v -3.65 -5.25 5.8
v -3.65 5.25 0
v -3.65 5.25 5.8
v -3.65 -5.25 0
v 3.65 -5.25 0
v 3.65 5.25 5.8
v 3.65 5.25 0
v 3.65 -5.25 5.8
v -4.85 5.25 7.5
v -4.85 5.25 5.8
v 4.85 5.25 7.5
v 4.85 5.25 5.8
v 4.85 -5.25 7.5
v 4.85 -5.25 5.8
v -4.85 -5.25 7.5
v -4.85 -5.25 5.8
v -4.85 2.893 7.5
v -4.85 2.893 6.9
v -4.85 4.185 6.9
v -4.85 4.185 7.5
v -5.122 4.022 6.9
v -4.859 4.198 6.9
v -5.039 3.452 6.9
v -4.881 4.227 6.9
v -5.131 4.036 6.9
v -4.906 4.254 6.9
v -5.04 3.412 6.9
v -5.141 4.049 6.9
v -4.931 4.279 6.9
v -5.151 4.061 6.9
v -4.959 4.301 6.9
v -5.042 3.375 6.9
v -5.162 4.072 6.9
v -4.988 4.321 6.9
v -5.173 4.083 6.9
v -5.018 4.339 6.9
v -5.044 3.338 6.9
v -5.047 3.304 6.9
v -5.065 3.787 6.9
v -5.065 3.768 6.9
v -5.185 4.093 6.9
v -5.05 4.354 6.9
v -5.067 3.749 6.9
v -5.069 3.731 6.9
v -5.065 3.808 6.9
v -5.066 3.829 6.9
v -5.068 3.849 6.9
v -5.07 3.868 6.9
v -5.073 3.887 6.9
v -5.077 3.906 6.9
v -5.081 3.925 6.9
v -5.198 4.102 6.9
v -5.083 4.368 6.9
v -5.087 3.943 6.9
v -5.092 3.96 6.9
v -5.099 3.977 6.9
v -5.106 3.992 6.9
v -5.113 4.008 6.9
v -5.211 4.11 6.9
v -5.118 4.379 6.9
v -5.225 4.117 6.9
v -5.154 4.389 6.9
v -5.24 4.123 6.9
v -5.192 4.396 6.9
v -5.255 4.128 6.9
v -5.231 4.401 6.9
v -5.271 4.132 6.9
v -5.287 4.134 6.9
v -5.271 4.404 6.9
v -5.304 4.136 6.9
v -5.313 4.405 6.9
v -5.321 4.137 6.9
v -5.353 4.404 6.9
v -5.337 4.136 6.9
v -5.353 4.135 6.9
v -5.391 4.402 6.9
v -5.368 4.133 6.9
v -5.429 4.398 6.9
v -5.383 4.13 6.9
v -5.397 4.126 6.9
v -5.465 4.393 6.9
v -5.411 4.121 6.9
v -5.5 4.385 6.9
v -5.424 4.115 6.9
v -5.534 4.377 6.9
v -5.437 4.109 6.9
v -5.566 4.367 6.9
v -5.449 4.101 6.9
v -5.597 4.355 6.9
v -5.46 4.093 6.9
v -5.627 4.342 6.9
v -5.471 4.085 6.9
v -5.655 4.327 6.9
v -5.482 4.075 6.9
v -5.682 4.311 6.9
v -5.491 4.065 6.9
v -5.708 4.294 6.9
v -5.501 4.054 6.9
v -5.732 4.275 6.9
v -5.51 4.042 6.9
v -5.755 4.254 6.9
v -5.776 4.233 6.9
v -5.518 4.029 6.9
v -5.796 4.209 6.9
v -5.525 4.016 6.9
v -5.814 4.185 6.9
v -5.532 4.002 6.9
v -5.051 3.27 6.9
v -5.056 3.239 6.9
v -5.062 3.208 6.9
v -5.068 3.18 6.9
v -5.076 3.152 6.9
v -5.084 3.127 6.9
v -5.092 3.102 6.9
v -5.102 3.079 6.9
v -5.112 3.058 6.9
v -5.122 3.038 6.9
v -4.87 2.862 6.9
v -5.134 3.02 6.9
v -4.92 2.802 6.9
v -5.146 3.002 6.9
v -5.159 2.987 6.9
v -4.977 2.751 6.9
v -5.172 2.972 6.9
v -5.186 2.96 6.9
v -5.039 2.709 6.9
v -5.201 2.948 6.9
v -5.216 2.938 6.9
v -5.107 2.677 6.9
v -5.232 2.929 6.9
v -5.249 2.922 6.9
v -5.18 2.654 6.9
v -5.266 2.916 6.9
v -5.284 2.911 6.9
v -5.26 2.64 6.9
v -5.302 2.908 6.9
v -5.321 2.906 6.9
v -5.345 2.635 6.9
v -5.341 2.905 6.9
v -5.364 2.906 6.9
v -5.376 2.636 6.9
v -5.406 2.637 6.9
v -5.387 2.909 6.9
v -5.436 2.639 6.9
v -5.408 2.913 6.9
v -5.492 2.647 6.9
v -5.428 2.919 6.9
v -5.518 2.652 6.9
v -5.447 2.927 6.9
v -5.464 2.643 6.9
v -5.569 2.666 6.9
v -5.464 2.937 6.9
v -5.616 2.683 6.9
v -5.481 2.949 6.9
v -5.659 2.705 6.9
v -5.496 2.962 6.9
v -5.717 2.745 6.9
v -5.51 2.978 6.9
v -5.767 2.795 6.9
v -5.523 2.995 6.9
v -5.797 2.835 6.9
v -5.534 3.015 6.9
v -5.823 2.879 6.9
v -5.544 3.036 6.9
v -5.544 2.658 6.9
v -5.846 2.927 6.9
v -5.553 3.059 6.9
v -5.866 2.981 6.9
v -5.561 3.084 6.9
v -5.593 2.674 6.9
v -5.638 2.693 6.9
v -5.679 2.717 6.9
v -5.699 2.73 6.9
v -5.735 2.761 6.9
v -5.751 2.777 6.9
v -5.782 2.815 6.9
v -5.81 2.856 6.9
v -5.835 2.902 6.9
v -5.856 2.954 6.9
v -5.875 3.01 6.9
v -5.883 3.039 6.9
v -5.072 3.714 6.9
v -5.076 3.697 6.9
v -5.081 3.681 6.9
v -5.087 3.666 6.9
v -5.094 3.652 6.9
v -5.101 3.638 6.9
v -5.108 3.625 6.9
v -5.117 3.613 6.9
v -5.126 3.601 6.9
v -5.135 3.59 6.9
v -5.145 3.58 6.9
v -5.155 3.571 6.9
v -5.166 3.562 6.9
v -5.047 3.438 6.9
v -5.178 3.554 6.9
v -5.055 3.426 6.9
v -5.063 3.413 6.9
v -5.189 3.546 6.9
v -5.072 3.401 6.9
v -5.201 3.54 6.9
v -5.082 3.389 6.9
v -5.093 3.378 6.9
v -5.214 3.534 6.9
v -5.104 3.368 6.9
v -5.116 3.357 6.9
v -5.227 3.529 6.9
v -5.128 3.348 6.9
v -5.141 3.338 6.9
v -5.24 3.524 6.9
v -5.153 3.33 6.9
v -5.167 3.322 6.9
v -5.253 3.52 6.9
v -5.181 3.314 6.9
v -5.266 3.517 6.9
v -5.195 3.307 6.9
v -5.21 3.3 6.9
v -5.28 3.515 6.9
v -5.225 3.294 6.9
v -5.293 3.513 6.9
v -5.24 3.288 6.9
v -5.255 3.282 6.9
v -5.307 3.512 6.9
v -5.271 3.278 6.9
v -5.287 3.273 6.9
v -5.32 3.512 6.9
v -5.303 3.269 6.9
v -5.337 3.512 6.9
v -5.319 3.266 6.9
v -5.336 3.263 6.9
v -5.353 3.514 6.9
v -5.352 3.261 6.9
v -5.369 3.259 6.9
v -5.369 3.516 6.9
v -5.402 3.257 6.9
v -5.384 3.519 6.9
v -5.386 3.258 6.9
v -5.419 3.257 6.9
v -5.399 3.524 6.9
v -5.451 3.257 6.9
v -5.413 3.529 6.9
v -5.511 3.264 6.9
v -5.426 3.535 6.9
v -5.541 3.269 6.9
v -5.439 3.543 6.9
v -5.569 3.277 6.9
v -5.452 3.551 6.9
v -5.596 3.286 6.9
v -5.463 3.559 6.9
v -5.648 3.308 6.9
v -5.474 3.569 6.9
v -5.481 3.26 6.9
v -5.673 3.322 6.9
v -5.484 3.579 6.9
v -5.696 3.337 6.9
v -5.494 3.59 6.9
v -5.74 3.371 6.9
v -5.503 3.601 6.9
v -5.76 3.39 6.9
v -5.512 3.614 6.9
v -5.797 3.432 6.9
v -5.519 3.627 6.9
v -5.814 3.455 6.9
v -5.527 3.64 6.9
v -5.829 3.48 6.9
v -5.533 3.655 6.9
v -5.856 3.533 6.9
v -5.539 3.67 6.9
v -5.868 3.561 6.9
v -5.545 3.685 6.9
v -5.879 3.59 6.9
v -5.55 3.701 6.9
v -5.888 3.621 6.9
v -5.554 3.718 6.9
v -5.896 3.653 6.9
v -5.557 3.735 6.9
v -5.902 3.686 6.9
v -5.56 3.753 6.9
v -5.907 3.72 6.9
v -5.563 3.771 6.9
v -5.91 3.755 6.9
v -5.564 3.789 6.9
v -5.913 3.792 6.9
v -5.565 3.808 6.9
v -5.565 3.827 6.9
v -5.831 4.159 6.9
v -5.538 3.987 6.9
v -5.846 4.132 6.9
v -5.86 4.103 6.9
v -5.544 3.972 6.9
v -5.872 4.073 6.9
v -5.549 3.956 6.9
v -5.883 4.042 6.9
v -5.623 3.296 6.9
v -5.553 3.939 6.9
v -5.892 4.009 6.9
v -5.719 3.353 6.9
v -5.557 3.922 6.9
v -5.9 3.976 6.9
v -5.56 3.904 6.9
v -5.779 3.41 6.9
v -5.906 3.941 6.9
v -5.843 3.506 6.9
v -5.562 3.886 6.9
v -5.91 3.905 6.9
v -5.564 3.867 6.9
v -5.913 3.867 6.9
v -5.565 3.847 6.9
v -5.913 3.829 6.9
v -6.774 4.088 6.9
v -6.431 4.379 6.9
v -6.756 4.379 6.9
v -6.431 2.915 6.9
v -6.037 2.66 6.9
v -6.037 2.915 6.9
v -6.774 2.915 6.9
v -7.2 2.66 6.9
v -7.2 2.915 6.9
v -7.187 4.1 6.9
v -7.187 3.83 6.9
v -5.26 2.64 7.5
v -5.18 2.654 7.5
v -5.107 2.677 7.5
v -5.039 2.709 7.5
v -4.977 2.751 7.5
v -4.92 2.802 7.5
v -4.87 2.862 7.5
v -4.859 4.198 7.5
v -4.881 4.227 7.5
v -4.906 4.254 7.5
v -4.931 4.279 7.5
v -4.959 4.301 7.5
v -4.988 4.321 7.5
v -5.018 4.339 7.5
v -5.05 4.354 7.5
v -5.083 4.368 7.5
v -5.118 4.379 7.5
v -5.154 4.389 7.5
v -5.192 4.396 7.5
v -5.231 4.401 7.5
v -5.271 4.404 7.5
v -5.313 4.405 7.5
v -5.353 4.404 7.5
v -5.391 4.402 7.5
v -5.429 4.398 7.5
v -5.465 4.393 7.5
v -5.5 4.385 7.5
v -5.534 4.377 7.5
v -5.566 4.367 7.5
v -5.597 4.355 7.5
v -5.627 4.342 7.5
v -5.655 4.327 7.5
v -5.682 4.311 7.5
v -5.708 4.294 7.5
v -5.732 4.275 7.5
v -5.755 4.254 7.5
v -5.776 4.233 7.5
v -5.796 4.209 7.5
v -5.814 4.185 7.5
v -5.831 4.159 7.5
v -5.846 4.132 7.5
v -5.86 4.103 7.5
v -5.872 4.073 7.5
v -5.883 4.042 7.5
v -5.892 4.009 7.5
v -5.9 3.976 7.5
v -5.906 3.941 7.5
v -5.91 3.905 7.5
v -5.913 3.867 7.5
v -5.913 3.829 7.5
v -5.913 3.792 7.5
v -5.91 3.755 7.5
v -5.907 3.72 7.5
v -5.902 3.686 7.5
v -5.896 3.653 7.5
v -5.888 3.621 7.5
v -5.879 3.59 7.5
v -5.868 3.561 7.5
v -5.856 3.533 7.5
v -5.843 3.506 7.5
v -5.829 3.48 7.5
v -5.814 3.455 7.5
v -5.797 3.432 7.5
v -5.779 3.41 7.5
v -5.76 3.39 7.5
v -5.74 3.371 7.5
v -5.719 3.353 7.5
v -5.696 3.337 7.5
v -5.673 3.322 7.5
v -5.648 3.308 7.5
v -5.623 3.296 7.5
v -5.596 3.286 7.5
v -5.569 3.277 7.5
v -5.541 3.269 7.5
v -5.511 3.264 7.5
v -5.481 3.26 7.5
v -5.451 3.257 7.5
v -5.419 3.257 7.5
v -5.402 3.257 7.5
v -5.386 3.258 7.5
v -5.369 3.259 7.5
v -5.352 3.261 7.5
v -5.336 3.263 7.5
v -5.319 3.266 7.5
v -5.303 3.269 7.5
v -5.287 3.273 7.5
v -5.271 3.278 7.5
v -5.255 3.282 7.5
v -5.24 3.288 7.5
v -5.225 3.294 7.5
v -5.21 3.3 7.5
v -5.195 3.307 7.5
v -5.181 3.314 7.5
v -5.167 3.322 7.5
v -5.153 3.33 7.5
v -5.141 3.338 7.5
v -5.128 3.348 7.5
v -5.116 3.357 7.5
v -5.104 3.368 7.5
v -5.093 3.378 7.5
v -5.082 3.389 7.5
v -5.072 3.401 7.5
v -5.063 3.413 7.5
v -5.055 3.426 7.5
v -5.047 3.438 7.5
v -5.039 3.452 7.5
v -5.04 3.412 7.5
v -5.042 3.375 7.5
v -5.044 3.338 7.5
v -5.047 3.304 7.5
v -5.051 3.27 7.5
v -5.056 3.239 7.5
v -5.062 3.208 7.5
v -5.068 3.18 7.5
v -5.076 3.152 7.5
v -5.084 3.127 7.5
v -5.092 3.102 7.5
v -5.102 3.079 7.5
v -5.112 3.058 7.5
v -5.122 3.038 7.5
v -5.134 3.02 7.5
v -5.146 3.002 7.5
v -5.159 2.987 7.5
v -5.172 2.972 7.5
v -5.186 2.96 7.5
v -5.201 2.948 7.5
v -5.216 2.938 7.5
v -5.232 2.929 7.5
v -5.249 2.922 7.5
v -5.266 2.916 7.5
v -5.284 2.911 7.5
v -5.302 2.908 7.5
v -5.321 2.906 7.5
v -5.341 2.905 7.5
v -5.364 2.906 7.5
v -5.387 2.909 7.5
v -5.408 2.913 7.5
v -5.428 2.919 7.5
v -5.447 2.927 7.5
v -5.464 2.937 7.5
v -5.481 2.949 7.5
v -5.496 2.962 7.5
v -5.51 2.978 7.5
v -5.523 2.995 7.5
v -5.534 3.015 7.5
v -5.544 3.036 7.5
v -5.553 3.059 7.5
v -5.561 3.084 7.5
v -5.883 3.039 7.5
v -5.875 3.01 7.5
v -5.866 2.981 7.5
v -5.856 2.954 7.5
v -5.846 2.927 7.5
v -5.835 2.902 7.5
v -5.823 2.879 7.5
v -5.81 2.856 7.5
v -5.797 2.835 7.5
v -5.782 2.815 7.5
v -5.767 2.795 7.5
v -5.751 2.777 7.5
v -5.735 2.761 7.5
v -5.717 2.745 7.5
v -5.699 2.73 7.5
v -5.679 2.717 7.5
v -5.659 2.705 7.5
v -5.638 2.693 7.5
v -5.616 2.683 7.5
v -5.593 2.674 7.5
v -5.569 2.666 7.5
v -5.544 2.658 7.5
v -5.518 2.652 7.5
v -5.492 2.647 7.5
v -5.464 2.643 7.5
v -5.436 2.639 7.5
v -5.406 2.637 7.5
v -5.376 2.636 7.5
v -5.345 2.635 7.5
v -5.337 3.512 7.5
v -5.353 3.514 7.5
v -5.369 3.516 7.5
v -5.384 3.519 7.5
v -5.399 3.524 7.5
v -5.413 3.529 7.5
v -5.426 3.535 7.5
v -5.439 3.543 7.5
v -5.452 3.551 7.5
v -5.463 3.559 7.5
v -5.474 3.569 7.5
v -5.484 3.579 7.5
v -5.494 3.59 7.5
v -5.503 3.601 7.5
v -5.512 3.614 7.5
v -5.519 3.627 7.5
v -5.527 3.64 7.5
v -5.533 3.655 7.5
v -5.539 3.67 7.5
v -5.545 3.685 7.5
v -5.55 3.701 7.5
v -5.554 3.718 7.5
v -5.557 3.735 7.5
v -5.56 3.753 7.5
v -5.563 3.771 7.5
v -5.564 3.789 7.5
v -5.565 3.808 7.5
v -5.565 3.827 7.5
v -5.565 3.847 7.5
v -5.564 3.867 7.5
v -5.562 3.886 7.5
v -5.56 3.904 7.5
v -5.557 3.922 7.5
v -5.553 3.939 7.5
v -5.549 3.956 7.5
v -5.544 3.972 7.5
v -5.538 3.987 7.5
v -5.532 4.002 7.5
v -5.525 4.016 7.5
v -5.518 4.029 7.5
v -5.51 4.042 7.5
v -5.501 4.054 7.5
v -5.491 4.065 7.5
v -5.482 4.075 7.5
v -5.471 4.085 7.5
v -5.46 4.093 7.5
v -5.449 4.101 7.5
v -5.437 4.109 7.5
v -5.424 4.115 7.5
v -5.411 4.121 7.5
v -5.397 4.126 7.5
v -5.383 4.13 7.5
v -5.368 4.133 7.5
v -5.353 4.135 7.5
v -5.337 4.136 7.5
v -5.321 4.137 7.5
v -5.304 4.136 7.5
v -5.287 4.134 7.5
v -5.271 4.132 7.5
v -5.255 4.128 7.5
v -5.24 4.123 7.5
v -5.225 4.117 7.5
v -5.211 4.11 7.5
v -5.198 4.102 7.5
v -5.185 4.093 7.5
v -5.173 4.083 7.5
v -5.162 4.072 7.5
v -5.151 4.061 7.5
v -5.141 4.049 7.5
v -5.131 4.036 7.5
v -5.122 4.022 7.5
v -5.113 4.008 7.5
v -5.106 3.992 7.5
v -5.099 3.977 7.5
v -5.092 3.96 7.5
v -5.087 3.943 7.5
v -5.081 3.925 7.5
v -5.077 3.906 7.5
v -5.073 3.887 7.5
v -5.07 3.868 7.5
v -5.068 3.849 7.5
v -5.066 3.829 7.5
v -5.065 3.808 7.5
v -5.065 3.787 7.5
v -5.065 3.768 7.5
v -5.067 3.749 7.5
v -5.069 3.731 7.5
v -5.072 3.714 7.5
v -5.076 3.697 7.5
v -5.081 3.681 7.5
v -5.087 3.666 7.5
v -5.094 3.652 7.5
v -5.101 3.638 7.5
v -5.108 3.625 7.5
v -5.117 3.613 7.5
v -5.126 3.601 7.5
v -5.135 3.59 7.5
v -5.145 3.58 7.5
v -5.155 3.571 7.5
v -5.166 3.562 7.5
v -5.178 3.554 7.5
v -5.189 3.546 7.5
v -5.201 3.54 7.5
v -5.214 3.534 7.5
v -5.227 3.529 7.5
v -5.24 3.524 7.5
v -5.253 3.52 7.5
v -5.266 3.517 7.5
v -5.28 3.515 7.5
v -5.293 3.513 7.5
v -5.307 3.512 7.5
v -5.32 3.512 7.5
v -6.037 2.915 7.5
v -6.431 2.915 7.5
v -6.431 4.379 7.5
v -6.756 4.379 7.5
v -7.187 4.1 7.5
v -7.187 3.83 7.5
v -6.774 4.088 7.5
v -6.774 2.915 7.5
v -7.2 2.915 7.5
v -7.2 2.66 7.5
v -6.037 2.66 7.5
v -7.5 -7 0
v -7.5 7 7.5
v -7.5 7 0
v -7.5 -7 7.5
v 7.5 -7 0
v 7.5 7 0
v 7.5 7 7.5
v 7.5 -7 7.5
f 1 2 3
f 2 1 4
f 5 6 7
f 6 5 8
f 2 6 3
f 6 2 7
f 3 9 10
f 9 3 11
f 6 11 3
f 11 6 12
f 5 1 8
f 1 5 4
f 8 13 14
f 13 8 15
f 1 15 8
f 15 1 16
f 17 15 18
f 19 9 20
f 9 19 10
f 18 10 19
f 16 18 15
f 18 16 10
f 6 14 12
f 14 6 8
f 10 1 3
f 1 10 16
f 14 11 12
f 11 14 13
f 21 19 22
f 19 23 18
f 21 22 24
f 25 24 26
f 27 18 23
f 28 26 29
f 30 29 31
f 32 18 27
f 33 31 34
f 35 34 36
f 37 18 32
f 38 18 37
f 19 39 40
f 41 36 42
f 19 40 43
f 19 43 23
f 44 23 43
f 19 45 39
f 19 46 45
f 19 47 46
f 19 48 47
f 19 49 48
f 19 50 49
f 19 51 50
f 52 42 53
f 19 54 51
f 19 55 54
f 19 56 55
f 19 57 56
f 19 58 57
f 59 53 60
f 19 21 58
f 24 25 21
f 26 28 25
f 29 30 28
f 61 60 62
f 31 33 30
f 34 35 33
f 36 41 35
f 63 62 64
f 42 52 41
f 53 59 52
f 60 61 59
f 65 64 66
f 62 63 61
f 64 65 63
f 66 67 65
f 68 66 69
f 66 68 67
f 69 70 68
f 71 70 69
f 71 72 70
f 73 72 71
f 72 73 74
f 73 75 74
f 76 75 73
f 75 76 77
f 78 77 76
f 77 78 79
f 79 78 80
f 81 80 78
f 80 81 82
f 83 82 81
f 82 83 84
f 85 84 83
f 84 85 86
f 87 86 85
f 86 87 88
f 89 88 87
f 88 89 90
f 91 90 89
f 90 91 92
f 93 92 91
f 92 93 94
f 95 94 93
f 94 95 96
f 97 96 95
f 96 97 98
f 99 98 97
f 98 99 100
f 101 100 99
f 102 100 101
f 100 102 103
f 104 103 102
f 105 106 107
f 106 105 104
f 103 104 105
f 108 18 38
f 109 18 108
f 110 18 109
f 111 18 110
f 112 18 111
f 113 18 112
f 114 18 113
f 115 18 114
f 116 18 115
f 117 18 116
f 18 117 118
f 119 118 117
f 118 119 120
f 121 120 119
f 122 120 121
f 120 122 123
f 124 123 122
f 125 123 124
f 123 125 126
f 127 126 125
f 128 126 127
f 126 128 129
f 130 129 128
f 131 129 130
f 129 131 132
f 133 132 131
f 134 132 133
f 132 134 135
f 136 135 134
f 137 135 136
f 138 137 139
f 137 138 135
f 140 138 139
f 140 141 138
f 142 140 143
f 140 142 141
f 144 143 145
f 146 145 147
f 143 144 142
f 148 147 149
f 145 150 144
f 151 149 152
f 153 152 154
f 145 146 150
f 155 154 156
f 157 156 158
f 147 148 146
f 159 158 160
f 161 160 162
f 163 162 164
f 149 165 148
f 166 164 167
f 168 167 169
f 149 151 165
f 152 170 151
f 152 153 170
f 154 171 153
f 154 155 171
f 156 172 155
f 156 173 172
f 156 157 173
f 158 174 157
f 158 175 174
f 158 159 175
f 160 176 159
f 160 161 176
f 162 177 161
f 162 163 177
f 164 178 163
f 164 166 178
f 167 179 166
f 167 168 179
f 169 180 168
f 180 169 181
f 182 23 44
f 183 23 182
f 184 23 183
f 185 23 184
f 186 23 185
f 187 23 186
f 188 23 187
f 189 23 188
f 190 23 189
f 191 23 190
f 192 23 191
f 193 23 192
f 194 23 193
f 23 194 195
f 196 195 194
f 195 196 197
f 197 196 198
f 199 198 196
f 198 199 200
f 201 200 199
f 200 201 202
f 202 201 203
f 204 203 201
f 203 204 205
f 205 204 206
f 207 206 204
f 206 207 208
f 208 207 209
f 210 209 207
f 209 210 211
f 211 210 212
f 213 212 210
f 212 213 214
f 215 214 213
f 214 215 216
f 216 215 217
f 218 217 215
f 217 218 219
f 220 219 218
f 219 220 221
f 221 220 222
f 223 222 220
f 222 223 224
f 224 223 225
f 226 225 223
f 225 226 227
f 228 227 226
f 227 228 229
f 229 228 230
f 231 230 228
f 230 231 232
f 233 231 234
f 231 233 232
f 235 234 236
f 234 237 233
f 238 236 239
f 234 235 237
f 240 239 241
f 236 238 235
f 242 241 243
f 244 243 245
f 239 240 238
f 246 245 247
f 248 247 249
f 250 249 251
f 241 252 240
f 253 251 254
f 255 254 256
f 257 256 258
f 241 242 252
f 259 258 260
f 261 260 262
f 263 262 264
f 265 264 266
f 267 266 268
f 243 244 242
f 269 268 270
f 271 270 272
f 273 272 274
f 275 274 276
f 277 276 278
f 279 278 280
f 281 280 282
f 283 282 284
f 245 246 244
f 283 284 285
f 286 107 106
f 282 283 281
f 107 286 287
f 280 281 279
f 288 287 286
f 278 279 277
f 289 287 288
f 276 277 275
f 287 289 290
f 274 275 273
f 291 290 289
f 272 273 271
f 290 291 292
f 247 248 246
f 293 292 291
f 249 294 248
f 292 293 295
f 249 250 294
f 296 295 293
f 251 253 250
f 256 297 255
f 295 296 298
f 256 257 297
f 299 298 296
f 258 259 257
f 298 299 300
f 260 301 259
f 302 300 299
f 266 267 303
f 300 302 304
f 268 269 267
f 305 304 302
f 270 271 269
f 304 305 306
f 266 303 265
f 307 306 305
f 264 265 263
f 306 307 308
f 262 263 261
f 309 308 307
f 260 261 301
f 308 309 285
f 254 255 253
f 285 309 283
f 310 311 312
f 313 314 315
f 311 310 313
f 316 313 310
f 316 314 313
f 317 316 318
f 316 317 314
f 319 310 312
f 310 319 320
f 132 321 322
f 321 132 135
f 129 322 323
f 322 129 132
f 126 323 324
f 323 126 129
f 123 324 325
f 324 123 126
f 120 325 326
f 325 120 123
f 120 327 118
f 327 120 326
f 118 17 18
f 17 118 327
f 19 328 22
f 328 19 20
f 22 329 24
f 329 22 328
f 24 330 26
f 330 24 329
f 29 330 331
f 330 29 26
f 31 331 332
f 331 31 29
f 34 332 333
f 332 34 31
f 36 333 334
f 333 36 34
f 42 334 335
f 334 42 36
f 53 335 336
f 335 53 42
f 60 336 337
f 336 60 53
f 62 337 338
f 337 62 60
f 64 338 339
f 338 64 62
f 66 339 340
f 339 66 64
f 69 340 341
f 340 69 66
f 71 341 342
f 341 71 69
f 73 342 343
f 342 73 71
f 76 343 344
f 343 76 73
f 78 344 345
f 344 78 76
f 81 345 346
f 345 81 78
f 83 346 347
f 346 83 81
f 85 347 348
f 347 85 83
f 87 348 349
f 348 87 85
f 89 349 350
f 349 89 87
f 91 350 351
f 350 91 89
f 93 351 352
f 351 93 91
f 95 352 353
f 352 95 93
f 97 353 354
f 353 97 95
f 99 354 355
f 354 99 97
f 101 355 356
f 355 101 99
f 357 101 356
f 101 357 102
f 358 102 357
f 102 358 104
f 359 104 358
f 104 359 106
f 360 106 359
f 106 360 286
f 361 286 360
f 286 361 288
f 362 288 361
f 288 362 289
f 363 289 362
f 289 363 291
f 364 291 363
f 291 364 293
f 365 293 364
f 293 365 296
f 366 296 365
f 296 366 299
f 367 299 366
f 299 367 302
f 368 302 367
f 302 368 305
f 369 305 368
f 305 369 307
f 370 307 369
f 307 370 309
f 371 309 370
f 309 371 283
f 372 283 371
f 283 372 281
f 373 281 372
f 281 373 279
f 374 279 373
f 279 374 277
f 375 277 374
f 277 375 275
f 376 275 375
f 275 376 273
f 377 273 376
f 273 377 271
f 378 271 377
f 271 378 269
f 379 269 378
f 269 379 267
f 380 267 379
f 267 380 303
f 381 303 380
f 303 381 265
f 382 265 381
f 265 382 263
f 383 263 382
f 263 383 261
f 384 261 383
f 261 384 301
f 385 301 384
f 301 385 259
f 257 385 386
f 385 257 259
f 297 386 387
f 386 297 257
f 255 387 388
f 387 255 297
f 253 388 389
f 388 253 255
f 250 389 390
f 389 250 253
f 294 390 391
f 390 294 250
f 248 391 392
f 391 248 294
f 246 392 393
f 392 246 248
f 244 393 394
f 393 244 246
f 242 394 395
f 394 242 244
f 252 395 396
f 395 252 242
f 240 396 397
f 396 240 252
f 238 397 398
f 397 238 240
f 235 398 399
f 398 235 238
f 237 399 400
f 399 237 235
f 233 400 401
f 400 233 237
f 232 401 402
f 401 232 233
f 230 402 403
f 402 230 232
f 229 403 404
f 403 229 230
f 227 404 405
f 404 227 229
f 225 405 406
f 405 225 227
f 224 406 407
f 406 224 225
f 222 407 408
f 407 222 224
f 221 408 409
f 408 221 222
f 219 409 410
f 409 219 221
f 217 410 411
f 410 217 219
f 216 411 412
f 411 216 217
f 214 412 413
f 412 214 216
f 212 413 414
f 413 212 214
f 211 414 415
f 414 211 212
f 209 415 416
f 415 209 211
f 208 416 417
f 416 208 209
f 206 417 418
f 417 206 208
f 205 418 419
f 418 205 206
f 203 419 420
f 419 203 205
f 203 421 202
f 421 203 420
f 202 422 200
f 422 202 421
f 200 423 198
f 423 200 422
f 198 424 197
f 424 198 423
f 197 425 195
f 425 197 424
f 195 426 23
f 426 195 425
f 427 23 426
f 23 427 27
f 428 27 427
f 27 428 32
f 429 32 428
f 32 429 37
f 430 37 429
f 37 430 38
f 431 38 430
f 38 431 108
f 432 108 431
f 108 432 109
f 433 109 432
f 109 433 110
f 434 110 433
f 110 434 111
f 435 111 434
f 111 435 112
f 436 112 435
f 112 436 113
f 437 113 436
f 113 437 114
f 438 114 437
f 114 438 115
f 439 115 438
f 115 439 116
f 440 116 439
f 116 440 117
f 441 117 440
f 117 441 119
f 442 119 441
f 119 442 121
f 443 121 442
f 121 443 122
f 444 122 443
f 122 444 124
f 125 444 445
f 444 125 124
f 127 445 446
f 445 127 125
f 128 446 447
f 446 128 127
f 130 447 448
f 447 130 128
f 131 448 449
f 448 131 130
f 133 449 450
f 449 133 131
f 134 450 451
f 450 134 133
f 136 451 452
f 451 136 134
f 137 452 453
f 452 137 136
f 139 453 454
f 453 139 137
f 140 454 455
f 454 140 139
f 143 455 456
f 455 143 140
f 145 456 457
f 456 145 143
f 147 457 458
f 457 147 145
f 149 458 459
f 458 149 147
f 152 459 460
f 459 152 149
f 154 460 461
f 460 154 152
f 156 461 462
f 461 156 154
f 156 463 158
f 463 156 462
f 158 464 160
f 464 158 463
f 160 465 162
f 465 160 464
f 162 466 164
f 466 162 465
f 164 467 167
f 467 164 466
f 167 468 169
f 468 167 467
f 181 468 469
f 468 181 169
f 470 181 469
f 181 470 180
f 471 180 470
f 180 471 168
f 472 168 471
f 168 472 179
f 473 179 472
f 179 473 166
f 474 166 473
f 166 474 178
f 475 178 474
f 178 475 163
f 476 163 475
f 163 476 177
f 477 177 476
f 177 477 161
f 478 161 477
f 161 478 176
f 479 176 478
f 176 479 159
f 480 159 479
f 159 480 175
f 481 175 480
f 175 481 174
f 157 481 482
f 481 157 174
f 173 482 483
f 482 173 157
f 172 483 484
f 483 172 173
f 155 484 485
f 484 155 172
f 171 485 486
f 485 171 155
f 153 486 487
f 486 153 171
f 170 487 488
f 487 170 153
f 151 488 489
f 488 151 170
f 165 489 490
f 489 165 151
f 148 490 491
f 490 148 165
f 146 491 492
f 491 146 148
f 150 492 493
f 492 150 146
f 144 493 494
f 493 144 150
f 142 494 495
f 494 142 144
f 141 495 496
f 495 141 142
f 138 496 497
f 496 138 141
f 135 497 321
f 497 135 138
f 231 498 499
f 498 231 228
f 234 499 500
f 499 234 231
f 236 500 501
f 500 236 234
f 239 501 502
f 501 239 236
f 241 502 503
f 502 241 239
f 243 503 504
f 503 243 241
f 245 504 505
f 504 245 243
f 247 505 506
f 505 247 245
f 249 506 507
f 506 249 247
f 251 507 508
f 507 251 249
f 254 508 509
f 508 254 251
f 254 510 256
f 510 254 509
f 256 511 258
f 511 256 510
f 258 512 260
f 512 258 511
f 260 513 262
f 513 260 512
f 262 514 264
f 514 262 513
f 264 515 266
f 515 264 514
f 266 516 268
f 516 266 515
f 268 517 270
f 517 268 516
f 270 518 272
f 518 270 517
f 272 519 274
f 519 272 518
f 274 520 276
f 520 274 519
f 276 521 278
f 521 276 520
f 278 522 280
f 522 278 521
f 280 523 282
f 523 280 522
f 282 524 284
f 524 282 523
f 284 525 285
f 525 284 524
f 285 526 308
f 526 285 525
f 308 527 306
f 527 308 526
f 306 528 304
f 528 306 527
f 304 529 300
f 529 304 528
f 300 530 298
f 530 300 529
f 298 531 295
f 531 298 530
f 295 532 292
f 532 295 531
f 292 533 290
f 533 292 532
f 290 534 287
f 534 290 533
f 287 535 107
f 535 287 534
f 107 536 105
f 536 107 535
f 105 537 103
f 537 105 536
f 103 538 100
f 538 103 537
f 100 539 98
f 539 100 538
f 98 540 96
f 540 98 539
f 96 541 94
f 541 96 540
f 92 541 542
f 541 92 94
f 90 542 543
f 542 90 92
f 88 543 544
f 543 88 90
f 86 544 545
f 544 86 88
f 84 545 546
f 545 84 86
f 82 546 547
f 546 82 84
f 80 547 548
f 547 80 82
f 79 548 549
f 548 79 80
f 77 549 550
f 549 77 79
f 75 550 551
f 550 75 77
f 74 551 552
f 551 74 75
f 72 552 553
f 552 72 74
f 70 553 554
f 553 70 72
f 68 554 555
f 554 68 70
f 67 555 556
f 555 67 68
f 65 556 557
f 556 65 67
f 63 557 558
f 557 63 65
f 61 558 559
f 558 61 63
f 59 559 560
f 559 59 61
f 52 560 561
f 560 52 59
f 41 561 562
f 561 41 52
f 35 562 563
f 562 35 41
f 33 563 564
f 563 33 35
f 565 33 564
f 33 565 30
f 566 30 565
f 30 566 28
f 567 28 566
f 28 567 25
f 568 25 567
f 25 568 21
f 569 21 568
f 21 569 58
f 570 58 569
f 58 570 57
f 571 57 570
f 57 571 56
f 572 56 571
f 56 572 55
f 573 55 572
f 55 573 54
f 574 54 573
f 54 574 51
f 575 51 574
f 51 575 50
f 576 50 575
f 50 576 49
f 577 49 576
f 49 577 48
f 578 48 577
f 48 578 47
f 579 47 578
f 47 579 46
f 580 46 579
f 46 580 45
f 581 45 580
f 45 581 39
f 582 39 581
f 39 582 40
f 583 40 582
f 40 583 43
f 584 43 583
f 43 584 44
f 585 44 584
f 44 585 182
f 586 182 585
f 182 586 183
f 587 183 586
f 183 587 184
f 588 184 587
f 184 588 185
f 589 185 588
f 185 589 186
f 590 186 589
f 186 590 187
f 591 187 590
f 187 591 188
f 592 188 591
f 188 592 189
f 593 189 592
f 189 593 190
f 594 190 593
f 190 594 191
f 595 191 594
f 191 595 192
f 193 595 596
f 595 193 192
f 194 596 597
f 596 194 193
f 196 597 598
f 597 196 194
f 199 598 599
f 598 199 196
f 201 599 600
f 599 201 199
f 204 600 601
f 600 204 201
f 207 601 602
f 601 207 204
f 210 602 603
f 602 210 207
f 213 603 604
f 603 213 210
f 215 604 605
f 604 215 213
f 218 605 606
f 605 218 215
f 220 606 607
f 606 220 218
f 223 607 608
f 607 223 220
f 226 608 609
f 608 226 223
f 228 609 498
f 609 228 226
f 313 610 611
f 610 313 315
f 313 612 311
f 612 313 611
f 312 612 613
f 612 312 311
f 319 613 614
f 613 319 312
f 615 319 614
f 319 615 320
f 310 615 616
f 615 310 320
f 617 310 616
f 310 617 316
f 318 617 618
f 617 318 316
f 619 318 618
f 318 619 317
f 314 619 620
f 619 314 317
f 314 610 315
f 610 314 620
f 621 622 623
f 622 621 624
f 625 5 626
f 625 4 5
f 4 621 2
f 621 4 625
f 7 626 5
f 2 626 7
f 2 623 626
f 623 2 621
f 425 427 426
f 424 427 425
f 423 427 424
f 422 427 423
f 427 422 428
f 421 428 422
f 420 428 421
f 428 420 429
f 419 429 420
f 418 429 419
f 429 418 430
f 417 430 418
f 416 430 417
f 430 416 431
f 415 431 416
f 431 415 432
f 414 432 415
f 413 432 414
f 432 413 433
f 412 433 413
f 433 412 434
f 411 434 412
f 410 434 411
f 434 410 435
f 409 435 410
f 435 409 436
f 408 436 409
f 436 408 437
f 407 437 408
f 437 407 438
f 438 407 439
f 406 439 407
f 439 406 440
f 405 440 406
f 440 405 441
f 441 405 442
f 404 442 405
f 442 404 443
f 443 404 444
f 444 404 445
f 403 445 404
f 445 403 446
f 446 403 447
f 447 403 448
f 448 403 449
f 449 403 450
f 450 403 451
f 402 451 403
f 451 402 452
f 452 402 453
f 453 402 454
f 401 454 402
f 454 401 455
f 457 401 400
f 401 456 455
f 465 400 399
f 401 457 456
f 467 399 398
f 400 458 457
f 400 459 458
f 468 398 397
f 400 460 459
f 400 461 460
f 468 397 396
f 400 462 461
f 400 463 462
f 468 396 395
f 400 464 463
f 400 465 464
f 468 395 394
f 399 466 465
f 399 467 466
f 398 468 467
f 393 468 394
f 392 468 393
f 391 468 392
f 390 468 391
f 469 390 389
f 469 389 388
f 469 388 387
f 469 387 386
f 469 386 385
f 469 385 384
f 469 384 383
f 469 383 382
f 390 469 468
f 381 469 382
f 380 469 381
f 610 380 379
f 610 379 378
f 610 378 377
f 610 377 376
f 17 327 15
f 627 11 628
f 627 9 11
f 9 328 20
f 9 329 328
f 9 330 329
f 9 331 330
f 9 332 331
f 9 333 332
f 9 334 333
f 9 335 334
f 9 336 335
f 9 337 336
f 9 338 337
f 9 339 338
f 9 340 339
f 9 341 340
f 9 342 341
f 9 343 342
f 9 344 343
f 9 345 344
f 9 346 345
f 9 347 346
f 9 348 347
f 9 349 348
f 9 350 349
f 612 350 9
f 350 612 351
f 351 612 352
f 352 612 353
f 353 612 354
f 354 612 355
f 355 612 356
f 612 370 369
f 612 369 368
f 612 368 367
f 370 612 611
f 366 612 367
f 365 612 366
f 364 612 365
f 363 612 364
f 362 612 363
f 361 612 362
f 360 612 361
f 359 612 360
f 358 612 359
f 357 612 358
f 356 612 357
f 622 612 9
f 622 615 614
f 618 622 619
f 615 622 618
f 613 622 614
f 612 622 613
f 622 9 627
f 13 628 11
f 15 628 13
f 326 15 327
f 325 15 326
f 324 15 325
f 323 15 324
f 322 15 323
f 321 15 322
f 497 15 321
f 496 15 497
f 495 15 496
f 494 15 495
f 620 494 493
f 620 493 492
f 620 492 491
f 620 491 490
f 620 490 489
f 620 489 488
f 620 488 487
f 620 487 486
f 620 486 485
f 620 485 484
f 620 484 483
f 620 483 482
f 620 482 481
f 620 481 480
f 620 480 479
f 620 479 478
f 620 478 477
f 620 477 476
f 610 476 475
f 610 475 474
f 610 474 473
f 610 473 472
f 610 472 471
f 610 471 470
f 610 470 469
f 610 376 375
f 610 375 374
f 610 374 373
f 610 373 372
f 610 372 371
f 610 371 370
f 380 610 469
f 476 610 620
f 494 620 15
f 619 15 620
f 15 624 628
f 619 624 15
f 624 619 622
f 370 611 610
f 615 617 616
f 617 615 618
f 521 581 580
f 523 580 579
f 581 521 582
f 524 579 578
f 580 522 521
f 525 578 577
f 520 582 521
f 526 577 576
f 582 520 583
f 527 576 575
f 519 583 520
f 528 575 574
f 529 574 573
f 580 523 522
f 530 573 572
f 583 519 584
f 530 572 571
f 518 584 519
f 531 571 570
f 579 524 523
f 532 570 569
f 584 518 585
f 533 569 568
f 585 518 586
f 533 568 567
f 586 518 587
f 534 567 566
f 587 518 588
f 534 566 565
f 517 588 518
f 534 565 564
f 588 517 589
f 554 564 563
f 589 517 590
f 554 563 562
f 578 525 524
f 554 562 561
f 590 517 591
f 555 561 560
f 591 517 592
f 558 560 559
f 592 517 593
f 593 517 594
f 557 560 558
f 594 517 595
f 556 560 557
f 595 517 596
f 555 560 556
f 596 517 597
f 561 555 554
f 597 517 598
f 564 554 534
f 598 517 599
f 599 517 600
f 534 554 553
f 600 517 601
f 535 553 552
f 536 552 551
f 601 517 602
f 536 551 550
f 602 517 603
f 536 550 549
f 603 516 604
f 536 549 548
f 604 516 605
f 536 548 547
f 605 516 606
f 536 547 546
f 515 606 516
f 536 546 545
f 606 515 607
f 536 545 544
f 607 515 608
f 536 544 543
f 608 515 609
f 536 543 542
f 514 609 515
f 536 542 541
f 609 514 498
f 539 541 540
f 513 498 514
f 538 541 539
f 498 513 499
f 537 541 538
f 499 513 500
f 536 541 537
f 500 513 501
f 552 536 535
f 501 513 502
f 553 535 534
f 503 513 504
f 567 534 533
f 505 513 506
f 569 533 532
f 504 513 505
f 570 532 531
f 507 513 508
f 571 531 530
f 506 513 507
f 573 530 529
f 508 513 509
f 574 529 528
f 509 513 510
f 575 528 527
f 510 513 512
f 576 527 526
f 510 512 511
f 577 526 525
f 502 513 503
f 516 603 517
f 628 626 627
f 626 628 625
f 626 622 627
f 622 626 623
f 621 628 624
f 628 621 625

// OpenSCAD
$fn = 50;

difference() {
	union() {
		translate(v = [0, -5, 7.5]) {
			rotate(a = [0, 180, 0]) {
				difference() {
					union() {
						translate(v = [-7.5, -2.0, 0]) {
							cube(size = [15.0, 14.0, 7.5]);
						}
					}
					union() {
						translate(v = [-3.65, -0.25, -0.1]) {
							cube(size = [7.3, 10.5, 7.7]);
						}
						translate(v = [-4.85, -0.25, -0.1]) {
							cube(size = [9.7, 10.5, 1.8]);
						}
						translate(v = [6, 8.5, 0.6]) {
							rotate(a = [0, 180, 0]) {
								linear_extrude(height = 0.7) {
									text(font = "Arial:style=Bold", halign = "center", size = 1.8, text = "19", valign = "center");
								}
							}
						}
					}
				}
			}
		}
	}
	union();
}
